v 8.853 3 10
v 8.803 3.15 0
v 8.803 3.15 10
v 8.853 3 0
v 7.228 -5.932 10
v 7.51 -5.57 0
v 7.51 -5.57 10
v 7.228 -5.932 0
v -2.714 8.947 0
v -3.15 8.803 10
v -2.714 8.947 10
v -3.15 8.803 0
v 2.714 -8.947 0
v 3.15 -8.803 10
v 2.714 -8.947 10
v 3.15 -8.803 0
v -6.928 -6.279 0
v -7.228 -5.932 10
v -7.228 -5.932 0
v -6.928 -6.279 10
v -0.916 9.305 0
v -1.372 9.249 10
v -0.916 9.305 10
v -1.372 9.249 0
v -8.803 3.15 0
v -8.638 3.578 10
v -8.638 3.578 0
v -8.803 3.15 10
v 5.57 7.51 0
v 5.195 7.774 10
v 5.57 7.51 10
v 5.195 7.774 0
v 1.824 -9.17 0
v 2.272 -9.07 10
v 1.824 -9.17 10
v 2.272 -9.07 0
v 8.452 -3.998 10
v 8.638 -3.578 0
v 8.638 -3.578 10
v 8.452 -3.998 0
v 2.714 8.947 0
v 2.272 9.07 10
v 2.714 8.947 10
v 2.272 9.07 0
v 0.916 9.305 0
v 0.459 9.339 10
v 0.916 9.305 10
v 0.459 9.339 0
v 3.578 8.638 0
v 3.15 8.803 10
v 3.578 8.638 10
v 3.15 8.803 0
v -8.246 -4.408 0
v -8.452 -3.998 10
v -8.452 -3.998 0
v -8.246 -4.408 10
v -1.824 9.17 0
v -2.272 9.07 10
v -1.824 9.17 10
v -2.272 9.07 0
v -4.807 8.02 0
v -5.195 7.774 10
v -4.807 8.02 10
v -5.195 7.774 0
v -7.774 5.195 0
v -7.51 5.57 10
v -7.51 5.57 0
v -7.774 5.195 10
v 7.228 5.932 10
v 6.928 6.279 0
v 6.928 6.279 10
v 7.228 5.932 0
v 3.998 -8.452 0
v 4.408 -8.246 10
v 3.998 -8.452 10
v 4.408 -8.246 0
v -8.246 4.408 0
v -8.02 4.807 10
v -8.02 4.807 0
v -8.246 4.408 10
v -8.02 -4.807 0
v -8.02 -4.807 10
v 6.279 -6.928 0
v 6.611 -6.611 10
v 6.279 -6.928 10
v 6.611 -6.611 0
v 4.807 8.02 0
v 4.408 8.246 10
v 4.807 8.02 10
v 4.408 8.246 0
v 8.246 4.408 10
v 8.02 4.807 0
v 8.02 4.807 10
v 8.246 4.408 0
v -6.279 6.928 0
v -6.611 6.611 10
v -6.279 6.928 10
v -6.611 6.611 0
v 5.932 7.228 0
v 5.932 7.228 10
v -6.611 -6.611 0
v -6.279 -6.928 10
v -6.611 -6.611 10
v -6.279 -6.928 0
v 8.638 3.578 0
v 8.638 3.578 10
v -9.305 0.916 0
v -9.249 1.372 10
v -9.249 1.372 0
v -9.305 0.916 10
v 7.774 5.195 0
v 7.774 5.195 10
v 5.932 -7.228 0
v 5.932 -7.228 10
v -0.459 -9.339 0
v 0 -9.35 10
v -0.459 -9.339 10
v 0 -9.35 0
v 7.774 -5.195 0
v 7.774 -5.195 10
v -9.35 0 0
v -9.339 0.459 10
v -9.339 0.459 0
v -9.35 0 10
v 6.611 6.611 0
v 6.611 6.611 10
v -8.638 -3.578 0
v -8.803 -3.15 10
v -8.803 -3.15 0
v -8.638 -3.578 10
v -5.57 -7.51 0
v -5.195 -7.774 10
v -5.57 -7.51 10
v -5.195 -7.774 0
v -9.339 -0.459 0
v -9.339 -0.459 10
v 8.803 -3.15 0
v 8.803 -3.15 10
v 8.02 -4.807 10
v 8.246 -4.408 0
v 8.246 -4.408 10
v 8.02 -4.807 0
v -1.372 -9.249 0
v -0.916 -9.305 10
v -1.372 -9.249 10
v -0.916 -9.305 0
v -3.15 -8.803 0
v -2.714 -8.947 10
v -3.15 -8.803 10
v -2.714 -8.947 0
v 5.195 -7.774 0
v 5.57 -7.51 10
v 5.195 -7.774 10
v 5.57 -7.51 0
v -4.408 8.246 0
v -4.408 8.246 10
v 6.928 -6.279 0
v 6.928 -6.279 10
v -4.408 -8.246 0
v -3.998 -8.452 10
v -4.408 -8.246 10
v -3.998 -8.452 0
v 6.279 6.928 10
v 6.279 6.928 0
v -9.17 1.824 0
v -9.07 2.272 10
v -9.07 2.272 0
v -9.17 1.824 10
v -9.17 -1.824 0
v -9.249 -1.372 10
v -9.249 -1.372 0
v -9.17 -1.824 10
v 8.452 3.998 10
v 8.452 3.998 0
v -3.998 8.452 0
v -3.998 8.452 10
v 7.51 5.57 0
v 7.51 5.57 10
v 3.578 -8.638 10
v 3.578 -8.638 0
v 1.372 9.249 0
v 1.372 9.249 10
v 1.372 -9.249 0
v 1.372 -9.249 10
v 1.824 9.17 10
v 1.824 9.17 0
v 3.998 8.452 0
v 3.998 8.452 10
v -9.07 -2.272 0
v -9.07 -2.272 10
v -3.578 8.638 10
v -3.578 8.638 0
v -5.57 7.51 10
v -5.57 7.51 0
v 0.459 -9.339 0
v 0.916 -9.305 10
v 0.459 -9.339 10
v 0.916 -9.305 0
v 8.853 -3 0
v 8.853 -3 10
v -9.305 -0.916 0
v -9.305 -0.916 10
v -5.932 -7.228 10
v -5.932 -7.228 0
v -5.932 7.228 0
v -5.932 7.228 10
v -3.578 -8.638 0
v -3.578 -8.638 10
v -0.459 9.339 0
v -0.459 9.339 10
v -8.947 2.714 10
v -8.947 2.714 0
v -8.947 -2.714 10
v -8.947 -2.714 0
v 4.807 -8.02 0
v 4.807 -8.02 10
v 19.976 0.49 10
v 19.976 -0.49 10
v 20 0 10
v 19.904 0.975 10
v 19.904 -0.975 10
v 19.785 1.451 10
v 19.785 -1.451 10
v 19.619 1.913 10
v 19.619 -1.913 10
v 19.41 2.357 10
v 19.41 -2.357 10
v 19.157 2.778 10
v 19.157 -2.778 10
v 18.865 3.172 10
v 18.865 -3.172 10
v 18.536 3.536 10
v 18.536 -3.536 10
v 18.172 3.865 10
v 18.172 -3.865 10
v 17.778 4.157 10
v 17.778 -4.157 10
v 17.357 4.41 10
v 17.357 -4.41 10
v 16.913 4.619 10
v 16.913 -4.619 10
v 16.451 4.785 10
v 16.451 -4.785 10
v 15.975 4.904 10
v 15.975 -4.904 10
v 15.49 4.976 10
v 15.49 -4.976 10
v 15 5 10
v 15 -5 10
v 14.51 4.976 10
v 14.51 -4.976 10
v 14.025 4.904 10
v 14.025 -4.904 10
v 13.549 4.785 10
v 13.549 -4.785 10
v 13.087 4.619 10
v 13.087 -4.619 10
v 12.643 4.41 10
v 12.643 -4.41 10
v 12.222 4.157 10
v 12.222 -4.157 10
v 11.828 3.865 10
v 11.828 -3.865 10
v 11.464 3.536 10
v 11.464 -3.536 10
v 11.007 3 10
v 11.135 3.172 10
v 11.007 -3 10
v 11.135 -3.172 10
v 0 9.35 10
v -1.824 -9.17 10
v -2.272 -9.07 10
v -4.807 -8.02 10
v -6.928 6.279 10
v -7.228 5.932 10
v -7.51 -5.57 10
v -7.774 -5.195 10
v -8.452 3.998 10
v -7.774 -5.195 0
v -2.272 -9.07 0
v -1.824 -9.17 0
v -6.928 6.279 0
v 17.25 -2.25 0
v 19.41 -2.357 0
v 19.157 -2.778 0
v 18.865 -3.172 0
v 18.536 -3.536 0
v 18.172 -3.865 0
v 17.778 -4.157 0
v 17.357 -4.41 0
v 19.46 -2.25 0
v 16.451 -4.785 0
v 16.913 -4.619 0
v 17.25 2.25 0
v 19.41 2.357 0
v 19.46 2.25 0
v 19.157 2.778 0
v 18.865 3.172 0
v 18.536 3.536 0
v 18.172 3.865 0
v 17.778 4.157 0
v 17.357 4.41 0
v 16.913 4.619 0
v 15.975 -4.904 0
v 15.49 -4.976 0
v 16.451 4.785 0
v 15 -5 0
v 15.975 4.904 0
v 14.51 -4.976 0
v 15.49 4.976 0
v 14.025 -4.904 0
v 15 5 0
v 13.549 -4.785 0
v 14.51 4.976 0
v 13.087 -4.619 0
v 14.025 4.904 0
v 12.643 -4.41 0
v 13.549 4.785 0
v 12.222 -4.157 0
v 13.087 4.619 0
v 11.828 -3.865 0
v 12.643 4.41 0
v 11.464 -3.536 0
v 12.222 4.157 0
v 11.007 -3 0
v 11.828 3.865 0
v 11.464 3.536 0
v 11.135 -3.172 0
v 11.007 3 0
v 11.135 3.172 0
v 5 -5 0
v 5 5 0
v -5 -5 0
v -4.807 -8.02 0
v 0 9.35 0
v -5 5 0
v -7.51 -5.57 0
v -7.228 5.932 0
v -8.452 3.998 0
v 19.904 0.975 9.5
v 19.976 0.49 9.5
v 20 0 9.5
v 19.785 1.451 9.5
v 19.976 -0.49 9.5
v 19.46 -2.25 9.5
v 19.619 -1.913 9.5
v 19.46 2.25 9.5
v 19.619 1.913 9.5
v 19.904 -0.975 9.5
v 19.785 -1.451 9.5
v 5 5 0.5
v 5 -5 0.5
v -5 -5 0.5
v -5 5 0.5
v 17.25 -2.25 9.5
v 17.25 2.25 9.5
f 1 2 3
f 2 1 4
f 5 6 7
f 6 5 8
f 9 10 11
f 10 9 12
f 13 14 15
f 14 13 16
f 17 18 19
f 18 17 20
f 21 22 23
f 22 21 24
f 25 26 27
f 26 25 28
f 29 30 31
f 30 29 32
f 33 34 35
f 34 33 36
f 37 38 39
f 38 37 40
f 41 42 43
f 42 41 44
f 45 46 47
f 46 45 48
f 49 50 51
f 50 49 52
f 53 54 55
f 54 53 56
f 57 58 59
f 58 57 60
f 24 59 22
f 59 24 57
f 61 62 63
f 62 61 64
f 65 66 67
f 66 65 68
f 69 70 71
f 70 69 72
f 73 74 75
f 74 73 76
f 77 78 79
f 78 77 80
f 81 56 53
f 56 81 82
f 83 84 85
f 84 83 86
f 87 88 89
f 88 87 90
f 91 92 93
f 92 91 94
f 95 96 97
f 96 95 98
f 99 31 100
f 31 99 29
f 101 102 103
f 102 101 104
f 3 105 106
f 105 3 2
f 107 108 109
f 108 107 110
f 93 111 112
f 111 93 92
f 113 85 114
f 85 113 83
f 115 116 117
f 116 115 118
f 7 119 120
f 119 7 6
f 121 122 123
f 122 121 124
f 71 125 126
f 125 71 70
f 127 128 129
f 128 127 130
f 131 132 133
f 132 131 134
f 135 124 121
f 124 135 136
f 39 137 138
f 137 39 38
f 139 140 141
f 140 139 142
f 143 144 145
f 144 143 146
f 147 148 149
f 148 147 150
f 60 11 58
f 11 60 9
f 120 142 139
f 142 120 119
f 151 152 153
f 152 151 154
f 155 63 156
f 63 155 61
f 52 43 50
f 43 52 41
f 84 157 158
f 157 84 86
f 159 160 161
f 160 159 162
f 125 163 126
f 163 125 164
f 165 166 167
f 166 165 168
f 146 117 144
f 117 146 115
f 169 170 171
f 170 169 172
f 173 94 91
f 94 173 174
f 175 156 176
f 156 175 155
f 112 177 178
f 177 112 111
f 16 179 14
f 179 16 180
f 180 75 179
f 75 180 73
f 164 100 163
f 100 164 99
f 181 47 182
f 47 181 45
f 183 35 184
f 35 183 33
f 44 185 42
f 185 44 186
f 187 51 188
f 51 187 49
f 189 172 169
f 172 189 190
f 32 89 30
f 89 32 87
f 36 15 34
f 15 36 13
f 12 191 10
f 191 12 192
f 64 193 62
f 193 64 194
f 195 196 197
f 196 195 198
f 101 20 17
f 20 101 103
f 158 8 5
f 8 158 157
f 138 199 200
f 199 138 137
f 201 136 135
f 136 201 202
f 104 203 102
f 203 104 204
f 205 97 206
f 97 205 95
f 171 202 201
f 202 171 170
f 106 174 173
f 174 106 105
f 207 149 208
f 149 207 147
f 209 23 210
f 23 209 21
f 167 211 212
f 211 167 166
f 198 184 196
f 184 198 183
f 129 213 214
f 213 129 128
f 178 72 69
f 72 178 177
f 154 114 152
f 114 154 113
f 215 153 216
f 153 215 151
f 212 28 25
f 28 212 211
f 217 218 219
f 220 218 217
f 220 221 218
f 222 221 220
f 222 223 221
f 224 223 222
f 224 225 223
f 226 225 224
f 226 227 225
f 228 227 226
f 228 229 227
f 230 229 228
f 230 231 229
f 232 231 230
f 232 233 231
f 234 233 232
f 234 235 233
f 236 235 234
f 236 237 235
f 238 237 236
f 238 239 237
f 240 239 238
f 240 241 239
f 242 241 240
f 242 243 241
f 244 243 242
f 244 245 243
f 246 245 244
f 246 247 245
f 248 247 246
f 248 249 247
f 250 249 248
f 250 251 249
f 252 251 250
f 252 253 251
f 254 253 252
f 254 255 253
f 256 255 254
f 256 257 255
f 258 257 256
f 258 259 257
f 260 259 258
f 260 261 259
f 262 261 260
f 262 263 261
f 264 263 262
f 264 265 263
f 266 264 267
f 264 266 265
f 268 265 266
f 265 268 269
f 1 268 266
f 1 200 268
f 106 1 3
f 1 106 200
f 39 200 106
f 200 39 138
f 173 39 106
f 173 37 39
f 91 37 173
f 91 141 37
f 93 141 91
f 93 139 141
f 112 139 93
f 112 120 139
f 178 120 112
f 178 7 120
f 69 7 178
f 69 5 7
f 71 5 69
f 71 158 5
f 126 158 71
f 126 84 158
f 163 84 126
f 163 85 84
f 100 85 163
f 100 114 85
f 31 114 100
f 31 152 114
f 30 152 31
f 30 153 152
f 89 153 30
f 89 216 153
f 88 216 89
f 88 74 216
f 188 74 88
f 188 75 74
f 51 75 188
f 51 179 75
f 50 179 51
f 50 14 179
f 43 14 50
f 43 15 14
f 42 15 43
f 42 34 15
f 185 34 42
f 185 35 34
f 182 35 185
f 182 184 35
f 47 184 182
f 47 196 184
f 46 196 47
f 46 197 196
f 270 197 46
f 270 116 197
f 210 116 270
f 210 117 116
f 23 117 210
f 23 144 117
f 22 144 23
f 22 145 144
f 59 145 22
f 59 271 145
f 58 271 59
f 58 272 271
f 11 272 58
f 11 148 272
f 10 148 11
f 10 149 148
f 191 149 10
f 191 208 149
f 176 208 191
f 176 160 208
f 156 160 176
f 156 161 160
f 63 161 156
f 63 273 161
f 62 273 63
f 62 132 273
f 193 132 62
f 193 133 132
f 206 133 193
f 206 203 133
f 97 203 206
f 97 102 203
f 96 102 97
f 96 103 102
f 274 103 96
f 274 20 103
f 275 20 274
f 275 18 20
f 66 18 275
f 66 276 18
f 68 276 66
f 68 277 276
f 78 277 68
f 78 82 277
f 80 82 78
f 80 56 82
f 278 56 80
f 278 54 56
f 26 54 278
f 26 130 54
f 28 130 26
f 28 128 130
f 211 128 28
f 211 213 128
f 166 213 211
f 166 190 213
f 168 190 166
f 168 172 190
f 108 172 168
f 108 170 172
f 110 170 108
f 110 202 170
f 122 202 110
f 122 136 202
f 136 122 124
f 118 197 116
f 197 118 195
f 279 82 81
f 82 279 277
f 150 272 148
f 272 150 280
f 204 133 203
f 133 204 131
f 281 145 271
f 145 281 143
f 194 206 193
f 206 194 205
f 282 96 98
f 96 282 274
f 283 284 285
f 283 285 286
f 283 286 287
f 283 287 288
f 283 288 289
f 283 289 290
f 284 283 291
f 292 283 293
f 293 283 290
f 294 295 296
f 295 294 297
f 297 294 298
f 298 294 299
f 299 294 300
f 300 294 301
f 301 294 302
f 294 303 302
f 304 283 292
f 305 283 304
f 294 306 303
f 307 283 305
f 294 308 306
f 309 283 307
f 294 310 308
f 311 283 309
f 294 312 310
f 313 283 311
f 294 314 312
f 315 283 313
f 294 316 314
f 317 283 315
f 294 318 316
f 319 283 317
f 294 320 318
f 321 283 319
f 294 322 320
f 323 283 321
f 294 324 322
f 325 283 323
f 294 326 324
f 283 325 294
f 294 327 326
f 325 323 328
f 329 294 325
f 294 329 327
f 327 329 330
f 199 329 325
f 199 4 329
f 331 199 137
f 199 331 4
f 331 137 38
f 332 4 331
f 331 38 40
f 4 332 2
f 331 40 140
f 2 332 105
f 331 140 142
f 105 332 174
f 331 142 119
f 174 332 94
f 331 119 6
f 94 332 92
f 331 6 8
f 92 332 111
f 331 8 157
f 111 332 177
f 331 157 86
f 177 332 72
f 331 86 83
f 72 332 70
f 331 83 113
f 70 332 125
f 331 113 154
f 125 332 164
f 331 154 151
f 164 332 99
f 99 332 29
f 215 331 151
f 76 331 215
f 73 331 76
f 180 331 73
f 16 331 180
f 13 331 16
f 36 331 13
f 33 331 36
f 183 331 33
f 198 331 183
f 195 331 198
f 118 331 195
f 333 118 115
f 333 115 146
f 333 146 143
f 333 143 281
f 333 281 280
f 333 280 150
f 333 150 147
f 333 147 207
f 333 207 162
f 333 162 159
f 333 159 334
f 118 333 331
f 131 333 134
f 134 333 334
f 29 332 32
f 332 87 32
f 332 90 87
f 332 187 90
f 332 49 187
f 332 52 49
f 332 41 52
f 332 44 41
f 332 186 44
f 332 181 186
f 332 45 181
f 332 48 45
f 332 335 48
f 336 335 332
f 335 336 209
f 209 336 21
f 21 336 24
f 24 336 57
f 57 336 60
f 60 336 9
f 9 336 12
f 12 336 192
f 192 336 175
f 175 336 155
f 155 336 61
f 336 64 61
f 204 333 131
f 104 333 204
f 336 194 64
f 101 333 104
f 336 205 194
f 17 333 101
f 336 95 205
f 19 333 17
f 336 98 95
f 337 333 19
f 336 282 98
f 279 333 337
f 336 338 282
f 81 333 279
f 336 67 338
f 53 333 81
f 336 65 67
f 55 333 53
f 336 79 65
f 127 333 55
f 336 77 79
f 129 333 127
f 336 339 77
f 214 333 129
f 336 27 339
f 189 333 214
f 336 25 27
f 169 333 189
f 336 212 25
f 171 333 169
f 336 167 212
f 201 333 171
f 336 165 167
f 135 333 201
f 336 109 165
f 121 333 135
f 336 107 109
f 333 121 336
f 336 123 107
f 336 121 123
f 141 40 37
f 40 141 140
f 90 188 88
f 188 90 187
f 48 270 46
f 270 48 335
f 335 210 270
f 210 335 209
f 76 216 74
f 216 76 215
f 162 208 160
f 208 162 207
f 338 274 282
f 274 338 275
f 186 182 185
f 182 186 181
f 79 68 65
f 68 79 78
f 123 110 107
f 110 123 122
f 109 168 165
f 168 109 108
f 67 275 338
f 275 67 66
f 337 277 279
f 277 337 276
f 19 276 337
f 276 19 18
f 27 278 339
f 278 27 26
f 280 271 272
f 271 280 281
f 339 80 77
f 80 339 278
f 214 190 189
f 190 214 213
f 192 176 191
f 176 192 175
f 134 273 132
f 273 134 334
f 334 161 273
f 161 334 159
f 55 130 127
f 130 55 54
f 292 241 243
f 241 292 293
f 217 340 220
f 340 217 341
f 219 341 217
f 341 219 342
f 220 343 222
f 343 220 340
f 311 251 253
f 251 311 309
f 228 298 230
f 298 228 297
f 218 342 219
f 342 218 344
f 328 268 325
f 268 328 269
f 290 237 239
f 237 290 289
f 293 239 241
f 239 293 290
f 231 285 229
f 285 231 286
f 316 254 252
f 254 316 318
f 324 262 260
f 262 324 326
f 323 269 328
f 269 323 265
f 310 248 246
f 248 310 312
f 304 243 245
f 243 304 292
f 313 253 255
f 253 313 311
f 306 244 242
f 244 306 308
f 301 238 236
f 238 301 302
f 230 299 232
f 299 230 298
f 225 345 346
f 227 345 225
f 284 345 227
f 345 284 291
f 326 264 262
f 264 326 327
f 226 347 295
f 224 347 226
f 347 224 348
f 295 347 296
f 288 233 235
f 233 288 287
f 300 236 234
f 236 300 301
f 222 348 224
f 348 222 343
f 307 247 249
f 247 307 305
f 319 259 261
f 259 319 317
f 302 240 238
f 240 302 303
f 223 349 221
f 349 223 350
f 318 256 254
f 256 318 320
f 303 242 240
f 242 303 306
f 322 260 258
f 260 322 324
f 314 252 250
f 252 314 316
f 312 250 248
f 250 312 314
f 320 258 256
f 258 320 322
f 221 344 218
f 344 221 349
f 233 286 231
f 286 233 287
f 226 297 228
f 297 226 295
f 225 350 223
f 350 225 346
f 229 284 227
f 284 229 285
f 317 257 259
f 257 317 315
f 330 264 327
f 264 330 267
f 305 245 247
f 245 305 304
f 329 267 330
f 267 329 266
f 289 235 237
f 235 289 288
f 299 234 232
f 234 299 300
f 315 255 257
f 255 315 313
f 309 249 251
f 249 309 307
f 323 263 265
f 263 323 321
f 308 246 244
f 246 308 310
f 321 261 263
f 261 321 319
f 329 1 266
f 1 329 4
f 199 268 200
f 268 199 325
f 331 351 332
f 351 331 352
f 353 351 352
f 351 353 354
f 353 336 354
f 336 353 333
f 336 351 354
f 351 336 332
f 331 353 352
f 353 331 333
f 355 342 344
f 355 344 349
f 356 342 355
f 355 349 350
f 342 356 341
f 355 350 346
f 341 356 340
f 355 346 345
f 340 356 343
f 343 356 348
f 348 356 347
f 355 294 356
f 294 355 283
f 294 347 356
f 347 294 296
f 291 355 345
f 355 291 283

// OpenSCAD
// Snap-on tubing and stand rod clip (printed flat)
// Units: mm

// ---- Stand rod ring ----
stand_d     = 12.7;   // inner diameter of stand rod ring
stand_wall  = 3;       // wall thickness of stand rod ring
stand_r     = stand_d/2 + stand_wall;  // outer radius (18.7)
stand_open  = 10;      // width of opening on -X side

// ---- Tubing ring ----
tube_d      = 6;       // inner diameter of tubing ring
tube_wall   = 2;       // wall thickness of tubing ring
tube_r      = tube_d/2 + tube_wall;    // outer radius (5)
tube_x      = 15;      // centre X of tubing ring
tube_open   = 4.5;     // width of opening on +X side

// ---- Bridge ----
bridge_w    = 6;       // bridge width (Y)
bridge_x0   = 8;       // bridge start (X)
bridge_x1   = 12;      // bridge end (X)

// ---- Misc ----
eps         = 0.5;     // cutter overshoot
$fn         = 96;

difference() {
    union() {
        // Stand rod ring
        cylinder(r = stand_r, h = 10, $fn = 128);
        // Tubing ring
        translate([tube_x, 0, 0])
            cylinder(r = tube_r, h = 10, $fn = 64);
        // Bridge
        translate([bridge_x0, -bridge_w/2, 0])
            cube([bridge_x1 - bridge_x0, bridge_w, 10]);
    }
    // Openings
    translate([-stand_open/2, -5, -eps])
        cube([stand_open, 10, 2*eps]);              // stand -X opening
    translate([tube_x + tube_open/2, -tube_open/2, -eps])
        cube([tube_open, 2*tube_open/2, 10]);       // tubing +X opening
}
